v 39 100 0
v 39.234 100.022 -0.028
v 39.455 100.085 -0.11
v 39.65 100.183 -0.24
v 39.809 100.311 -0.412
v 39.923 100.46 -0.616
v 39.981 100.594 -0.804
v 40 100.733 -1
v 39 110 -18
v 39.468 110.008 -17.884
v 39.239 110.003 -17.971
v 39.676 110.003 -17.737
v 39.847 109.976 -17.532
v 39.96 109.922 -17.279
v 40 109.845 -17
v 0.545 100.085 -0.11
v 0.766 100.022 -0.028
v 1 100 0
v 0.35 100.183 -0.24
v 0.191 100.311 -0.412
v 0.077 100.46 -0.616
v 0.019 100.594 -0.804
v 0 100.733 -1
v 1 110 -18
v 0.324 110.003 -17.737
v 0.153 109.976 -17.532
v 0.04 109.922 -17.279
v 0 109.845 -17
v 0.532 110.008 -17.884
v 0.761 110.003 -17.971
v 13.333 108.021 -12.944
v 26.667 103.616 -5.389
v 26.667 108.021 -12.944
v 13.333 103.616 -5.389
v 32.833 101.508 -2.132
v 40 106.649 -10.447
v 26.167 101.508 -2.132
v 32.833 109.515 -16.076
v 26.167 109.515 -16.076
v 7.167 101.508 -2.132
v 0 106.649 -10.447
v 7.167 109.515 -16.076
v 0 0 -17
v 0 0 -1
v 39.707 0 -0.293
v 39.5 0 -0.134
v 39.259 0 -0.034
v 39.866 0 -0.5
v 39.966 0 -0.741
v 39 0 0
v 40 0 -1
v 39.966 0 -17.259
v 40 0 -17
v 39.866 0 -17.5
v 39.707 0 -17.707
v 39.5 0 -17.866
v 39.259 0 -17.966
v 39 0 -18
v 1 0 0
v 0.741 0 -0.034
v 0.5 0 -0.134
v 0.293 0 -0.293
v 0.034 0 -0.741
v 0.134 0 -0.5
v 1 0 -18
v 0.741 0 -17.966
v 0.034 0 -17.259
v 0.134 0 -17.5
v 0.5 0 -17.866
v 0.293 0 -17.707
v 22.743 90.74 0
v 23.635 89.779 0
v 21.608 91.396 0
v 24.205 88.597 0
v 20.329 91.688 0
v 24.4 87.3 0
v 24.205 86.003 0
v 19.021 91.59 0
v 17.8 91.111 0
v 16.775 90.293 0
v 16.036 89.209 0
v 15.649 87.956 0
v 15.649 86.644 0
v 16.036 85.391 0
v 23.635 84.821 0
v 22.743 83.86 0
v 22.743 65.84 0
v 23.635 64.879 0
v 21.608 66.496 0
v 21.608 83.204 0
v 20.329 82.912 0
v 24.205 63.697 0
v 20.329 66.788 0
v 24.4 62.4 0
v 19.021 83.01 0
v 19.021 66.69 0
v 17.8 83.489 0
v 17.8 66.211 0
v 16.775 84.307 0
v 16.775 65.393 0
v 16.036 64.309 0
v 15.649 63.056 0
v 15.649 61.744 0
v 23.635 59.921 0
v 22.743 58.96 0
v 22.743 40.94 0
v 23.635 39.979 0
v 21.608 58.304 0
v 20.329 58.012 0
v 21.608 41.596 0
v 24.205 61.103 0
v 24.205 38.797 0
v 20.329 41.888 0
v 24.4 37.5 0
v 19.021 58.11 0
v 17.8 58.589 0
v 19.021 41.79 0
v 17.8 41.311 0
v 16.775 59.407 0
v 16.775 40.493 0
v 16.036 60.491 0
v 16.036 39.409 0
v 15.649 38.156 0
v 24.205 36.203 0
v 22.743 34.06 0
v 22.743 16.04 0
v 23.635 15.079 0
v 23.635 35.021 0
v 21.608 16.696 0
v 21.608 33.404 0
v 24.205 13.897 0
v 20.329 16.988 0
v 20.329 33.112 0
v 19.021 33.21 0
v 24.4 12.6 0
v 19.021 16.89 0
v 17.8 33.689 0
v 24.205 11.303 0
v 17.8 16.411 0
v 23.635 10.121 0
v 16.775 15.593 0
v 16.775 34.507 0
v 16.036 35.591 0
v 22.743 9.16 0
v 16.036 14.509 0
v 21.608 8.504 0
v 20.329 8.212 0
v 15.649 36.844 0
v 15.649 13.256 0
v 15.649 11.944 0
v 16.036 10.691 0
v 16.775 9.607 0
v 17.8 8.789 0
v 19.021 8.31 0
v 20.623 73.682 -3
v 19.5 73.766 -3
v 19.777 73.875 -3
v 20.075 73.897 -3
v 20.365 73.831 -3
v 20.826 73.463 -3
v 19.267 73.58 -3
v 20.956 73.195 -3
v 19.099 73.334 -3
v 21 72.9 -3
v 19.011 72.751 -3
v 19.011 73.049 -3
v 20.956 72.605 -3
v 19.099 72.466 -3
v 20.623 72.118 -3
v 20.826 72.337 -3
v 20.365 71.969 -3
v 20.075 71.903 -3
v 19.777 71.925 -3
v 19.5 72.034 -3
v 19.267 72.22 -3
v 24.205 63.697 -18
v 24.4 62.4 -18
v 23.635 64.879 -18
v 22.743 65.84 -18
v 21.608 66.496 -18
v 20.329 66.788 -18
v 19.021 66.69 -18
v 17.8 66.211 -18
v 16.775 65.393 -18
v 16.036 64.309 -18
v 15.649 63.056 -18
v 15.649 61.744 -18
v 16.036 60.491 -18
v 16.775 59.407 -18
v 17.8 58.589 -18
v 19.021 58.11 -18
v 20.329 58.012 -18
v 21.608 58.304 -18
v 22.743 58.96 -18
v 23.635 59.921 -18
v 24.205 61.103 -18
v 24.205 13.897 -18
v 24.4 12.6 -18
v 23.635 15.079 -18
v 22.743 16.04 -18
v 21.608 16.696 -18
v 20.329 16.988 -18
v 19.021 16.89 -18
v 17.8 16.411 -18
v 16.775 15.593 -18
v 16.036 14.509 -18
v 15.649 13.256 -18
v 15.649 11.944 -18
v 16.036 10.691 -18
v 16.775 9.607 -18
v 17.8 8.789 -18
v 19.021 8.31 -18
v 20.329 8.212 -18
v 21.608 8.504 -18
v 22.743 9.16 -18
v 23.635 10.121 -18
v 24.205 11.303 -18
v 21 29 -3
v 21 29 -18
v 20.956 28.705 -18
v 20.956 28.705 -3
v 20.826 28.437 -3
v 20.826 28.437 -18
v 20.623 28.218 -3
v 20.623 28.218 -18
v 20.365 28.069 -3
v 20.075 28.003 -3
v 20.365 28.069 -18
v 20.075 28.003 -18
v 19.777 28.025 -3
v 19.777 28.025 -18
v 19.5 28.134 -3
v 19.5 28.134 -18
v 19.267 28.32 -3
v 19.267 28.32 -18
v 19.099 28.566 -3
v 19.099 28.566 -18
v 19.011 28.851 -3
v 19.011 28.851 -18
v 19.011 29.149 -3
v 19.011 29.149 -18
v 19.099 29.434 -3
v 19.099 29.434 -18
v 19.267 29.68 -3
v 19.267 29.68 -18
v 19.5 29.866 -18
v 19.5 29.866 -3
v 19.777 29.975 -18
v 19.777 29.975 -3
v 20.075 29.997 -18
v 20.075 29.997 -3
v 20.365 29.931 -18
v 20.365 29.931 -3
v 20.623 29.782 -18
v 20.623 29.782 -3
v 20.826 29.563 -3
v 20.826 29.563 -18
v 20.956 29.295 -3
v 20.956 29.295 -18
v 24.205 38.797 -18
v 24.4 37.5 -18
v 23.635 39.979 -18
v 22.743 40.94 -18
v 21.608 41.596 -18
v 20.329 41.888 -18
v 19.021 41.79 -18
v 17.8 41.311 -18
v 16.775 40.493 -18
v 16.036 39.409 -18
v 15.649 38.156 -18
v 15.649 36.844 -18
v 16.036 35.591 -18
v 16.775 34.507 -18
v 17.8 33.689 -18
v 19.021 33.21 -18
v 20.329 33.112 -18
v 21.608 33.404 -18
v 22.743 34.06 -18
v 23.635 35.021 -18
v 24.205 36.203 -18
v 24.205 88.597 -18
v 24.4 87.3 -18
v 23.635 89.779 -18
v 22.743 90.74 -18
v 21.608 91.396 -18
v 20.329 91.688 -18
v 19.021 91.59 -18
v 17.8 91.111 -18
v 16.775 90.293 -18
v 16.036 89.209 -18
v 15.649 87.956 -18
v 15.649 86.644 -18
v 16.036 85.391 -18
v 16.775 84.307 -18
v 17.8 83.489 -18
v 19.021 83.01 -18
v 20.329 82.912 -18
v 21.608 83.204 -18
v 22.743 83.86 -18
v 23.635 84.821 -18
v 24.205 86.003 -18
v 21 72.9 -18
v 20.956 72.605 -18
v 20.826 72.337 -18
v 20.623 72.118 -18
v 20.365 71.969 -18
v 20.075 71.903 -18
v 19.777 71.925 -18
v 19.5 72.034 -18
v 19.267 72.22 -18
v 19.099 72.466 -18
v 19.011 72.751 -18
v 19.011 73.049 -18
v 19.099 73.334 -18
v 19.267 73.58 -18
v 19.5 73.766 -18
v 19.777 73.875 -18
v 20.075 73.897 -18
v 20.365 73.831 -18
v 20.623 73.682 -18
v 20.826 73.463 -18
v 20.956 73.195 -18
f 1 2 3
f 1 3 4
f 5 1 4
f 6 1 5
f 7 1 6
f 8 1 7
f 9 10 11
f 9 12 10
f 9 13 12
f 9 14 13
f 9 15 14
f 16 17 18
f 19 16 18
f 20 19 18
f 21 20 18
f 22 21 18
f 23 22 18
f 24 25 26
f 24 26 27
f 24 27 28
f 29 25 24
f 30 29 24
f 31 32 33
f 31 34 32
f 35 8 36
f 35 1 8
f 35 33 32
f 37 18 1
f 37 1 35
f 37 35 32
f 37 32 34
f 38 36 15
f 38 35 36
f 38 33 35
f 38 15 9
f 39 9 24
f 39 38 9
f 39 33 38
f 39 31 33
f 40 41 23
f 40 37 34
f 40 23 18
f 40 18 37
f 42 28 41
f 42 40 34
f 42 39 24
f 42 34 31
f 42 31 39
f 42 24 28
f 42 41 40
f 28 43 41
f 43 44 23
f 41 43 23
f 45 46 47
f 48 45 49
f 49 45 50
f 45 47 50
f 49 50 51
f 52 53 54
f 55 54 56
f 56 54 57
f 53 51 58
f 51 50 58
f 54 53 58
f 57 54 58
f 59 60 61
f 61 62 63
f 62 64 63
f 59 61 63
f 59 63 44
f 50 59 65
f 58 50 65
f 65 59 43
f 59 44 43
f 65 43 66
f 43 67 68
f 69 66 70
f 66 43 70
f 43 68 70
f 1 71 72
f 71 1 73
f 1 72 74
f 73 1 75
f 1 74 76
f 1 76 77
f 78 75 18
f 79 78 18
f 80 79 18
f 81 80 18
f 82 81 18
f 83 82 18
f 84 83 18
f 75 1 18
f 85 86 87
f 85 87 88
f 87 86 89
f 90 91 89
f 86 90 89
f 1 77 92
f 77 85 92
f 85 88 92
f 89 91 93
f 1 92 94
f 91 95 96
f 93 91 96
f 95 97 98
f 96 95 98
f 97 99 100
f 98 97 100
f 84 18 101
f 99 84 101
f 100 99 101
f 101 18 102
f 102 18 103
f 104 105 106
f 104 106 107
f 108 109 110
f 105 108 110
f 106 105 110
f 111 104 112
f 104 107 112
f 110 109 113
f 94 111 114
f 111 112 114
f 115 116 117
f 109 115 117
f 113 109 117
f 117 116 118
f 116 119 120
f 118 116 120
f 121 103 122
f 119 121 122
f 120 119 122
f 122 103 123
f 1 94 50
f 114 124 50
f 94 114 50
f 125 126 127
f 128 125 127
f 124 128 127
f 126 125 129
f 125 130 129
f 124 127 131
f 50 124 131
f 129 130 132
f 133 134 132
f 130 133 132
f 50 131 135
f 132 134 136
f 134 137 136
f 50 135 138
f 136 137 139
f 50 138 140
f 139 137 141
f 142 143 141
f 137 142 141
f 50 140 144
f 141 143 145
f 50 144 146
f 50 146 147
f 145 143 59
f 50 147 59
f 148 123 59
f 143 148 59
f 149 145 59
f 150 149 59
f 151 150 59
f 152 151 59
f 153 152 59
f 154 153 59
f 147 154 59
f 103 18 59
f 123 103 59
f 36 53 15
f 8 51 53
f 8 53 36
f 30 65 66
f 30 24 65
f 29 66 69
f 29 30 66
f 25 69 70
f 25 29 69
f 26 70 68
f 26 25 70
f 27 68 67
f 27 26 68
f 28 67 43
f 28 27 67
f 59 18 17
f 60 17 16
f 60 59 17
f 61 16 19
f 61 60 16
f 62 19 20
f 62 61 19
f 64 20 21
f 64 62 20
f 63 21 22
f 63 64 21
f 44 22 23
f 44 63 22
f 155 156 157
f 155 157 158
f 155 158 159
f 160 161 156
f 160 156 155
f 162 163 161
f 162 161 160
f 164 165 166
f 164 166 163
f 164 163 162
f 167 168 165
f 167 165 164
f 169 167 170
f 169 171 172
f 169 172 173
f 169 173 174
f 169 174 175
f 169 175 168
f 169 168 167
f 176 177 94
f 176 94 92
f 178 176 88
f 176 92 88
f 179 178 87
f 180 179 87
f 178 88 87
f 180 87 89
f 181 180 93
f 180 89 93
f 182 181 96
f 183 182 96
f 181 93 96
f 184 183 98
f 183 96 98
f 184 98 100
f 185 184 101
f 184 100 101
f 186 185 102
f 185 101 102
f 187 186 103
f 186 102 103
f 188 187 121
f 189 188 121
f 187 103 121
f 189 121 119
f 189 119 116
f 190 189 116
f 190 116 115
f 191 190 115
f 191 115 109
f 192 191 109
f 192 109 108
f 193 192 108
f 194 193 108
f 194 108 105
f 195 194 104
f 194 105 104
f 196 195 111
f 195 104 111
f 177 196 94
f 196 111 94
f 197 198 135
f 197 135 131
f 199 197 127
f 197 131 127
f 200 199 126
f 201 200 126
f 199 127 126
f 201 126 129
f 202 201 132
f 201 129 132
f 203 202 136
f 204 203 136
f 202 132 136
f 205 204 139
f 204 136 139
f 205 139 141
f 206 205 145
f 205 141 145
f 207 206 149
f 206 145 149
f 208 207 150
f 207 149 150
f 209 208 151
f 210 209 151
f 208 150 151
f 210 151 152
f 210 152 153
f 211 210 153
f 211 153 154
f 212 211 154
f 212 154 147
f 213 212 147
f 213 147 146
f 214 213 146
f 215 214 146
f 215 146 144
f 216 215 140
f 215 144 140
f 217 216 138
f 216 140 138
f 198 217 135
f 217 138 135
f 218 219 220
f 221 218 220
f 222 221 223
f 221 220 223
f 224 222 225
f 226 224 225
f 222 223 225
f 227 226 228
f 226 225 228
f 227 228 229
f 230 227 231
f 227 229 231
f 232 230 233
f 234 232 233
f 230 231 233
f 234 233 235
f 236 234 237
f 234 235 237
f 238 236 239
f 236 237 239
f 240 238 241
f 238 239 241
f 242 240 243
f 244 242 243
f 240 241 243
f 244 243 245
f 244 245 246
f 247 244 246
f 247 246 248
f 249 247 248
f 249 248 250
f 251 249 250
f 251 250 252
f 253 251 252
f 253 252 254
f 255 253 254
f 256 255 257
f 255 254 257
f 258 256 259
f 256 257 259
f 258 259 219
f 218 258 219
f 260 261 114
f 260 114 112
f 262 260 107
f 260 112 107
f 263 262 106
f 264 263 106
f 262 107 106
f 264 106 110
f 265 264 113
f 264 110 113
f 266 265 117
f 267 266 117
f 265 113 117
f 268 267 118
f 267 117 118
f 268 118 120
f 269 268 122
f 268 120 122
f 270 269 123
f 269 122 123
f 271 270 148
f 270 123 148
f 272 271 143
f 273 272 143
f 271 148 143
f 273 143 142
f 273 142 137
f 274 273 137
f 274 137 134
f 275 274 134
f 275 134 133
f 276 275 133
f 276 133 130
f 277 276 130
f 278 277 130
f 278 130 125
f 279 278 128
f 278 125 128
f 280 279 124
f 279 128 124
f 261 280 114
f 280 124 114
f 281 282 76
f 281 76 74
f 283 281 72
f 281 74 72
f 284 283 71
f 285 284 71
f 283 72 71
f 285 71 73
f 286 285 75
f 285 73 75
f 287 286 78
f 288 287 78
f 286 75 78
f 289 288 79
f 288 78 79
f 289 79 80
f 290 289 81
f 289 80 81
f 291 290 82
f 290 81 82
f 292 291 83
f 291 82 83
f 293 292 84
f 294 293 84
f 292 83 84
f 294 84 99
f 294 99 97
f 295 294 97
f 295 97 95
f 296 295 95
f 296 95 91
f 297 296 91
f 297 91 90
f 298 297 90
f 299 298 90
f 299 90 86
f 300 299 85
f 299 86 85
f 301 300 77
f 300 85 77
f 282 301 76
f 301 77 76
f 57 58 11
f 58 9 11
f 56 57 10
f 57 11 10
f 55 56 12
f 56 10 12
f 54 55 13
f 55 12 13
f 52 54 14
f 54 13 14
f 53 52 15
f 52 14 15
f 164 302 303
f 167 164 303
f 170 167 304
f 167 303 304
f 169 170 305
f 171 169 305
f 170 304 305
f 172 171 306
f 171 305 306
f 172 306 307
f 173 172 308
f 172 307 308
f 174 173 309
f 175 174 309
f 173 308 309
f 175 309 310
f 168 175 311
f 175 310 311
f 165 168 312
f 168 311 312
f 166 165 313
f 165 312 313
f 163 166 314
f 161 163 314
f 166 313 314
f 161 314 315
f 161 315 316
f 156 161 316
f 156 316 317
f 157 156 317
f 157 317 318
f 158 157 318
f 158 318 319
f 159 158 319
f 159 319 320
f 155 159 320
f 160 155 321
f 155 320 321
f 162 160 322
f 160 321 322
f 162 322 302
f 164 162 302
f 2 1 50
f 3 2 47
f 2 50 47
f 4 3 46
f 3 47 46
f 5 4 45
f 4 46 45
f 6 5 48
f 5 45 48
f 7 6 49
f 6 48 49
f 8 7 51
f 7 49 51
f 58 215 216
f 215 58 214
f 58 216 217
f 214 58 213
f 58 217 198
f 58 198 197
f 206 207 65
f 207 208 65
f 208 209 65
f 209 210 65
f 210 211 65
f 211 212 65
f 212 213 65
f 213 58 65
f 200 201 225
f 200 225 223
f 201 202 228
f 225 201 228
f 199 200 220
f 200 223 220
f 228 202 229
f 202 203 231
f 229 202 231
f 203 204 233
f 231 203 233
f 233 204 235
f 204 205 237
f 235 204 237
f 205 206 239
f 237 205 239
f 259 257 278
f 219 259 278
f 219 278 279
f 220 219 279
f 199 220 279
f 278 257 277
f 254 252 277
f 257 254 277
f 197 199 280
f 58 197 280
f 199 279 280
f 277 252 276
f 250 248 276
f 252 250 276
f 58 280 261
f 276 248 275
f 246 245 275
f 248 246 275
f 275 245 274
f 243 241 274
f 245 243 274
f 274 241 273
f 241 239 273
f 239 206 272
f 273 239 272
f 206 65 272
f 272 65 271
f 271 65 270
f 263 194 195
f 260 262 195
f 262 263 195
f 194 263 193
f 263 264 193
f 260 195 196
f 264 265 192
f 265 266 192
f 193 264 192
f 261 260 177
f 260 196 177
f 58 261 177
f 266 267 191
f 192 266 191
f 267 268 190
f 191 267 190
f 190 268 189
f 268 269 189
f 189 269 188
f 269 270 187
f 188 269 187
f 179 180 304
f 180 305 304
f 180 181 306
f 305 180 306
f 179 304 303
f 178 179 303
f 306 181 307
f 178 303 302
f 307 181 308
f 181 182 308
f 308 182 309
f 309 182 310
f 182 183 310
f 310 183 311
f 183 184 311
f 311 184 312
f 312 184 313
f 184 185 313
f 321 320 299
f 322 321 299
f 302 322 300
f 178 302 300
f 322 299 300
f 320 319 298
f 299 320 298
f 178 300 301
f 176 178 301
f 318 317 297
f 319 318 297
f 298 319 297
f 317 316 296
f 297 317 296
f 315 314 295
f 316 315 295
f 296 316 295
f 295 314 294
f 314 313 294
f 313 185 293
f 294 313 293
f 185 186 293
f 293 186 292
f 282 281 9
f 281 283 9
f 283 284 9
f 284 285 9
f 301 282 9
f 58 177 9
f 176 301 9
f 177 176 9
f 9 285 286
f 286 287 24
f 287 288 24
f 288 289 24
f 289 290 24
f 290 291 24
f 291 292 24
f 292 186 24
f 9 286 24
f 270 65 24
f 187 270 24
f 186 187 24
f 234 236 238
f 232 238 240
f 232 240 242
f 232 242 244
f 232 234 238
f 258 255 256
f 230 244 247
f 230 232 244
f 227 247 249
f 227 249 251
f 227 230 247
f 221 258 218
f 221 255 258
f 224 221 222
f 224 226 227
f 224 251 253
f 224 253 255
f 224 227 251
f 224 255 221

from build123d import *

# Parameters (mm, degrees)
F1_DEPTH = 40
F2_R     = 4.4
F3_DEPTH = 18
F4_R     = 1
F5_R     = 1
F6_DEPTH = 15


with BuildPart() as f1:
    # F0 (on Right) → F1 (new body)
    with BuildSketch(Plane.YZ):
        with BuildLine():
            Line((0, 0), (0, -18))
            Line((0, -18), (108.1519347629, -18))
            Line((108.1519347629, -18), (110, -18))
            add(Edge.make_bspline(
                [(100, 0), (102.15, -2.75), (110.3054567735, -15.7496706799), (110, -18)],
                knots=[0, 0, 0, 0, 0.5188602886, 0.5188602886, 0.5188602886, 0.5188602886], degree=3))
            Line((100, 0), (0, 0))
        make_face()
    extrude(amount=F1_DEPTH)

    # F2 (on face) → F3 (cut, through all)
    with BuildSketch(Plane.XY):
        with Locations((20, 87.3)):
            Circle(F2_R)
        with Locations((20, 62.4)):
            Circle(F2_R)
        with Locations((20, 37.5)):
            Circle(F2_R)
        with Locations((20, 12.6)):
            Circle(F2_R)
    extrude(amount=-F3_DEPTH, mode=Mode.SUBTRACT)

    # F4
    f4_edges = [f1.edges().sort_by_distance(p)[0] for p in [
        (0, 50, 0),
        (0, 55, -18),
        (40, 50, 0),
        (40, 55, -18),
    ]]
    fillet(f4_edges, radius=F4_R)

    # F5 (on face) → F6 (cut)
    with BuildSketch(Plane(origin=(0, 0, -18), x_dir=(1, 0, 0), z_dir=(0, 0, -1))):
        with Locations((20, -72.9)):
            Circle(F5_R)
        with Locations((20, -29)):
            Circle(F5_R)
    extrude(amount=-F6_DEPTH, mode=Mode.SUBTRACT)


solid = f1.part
